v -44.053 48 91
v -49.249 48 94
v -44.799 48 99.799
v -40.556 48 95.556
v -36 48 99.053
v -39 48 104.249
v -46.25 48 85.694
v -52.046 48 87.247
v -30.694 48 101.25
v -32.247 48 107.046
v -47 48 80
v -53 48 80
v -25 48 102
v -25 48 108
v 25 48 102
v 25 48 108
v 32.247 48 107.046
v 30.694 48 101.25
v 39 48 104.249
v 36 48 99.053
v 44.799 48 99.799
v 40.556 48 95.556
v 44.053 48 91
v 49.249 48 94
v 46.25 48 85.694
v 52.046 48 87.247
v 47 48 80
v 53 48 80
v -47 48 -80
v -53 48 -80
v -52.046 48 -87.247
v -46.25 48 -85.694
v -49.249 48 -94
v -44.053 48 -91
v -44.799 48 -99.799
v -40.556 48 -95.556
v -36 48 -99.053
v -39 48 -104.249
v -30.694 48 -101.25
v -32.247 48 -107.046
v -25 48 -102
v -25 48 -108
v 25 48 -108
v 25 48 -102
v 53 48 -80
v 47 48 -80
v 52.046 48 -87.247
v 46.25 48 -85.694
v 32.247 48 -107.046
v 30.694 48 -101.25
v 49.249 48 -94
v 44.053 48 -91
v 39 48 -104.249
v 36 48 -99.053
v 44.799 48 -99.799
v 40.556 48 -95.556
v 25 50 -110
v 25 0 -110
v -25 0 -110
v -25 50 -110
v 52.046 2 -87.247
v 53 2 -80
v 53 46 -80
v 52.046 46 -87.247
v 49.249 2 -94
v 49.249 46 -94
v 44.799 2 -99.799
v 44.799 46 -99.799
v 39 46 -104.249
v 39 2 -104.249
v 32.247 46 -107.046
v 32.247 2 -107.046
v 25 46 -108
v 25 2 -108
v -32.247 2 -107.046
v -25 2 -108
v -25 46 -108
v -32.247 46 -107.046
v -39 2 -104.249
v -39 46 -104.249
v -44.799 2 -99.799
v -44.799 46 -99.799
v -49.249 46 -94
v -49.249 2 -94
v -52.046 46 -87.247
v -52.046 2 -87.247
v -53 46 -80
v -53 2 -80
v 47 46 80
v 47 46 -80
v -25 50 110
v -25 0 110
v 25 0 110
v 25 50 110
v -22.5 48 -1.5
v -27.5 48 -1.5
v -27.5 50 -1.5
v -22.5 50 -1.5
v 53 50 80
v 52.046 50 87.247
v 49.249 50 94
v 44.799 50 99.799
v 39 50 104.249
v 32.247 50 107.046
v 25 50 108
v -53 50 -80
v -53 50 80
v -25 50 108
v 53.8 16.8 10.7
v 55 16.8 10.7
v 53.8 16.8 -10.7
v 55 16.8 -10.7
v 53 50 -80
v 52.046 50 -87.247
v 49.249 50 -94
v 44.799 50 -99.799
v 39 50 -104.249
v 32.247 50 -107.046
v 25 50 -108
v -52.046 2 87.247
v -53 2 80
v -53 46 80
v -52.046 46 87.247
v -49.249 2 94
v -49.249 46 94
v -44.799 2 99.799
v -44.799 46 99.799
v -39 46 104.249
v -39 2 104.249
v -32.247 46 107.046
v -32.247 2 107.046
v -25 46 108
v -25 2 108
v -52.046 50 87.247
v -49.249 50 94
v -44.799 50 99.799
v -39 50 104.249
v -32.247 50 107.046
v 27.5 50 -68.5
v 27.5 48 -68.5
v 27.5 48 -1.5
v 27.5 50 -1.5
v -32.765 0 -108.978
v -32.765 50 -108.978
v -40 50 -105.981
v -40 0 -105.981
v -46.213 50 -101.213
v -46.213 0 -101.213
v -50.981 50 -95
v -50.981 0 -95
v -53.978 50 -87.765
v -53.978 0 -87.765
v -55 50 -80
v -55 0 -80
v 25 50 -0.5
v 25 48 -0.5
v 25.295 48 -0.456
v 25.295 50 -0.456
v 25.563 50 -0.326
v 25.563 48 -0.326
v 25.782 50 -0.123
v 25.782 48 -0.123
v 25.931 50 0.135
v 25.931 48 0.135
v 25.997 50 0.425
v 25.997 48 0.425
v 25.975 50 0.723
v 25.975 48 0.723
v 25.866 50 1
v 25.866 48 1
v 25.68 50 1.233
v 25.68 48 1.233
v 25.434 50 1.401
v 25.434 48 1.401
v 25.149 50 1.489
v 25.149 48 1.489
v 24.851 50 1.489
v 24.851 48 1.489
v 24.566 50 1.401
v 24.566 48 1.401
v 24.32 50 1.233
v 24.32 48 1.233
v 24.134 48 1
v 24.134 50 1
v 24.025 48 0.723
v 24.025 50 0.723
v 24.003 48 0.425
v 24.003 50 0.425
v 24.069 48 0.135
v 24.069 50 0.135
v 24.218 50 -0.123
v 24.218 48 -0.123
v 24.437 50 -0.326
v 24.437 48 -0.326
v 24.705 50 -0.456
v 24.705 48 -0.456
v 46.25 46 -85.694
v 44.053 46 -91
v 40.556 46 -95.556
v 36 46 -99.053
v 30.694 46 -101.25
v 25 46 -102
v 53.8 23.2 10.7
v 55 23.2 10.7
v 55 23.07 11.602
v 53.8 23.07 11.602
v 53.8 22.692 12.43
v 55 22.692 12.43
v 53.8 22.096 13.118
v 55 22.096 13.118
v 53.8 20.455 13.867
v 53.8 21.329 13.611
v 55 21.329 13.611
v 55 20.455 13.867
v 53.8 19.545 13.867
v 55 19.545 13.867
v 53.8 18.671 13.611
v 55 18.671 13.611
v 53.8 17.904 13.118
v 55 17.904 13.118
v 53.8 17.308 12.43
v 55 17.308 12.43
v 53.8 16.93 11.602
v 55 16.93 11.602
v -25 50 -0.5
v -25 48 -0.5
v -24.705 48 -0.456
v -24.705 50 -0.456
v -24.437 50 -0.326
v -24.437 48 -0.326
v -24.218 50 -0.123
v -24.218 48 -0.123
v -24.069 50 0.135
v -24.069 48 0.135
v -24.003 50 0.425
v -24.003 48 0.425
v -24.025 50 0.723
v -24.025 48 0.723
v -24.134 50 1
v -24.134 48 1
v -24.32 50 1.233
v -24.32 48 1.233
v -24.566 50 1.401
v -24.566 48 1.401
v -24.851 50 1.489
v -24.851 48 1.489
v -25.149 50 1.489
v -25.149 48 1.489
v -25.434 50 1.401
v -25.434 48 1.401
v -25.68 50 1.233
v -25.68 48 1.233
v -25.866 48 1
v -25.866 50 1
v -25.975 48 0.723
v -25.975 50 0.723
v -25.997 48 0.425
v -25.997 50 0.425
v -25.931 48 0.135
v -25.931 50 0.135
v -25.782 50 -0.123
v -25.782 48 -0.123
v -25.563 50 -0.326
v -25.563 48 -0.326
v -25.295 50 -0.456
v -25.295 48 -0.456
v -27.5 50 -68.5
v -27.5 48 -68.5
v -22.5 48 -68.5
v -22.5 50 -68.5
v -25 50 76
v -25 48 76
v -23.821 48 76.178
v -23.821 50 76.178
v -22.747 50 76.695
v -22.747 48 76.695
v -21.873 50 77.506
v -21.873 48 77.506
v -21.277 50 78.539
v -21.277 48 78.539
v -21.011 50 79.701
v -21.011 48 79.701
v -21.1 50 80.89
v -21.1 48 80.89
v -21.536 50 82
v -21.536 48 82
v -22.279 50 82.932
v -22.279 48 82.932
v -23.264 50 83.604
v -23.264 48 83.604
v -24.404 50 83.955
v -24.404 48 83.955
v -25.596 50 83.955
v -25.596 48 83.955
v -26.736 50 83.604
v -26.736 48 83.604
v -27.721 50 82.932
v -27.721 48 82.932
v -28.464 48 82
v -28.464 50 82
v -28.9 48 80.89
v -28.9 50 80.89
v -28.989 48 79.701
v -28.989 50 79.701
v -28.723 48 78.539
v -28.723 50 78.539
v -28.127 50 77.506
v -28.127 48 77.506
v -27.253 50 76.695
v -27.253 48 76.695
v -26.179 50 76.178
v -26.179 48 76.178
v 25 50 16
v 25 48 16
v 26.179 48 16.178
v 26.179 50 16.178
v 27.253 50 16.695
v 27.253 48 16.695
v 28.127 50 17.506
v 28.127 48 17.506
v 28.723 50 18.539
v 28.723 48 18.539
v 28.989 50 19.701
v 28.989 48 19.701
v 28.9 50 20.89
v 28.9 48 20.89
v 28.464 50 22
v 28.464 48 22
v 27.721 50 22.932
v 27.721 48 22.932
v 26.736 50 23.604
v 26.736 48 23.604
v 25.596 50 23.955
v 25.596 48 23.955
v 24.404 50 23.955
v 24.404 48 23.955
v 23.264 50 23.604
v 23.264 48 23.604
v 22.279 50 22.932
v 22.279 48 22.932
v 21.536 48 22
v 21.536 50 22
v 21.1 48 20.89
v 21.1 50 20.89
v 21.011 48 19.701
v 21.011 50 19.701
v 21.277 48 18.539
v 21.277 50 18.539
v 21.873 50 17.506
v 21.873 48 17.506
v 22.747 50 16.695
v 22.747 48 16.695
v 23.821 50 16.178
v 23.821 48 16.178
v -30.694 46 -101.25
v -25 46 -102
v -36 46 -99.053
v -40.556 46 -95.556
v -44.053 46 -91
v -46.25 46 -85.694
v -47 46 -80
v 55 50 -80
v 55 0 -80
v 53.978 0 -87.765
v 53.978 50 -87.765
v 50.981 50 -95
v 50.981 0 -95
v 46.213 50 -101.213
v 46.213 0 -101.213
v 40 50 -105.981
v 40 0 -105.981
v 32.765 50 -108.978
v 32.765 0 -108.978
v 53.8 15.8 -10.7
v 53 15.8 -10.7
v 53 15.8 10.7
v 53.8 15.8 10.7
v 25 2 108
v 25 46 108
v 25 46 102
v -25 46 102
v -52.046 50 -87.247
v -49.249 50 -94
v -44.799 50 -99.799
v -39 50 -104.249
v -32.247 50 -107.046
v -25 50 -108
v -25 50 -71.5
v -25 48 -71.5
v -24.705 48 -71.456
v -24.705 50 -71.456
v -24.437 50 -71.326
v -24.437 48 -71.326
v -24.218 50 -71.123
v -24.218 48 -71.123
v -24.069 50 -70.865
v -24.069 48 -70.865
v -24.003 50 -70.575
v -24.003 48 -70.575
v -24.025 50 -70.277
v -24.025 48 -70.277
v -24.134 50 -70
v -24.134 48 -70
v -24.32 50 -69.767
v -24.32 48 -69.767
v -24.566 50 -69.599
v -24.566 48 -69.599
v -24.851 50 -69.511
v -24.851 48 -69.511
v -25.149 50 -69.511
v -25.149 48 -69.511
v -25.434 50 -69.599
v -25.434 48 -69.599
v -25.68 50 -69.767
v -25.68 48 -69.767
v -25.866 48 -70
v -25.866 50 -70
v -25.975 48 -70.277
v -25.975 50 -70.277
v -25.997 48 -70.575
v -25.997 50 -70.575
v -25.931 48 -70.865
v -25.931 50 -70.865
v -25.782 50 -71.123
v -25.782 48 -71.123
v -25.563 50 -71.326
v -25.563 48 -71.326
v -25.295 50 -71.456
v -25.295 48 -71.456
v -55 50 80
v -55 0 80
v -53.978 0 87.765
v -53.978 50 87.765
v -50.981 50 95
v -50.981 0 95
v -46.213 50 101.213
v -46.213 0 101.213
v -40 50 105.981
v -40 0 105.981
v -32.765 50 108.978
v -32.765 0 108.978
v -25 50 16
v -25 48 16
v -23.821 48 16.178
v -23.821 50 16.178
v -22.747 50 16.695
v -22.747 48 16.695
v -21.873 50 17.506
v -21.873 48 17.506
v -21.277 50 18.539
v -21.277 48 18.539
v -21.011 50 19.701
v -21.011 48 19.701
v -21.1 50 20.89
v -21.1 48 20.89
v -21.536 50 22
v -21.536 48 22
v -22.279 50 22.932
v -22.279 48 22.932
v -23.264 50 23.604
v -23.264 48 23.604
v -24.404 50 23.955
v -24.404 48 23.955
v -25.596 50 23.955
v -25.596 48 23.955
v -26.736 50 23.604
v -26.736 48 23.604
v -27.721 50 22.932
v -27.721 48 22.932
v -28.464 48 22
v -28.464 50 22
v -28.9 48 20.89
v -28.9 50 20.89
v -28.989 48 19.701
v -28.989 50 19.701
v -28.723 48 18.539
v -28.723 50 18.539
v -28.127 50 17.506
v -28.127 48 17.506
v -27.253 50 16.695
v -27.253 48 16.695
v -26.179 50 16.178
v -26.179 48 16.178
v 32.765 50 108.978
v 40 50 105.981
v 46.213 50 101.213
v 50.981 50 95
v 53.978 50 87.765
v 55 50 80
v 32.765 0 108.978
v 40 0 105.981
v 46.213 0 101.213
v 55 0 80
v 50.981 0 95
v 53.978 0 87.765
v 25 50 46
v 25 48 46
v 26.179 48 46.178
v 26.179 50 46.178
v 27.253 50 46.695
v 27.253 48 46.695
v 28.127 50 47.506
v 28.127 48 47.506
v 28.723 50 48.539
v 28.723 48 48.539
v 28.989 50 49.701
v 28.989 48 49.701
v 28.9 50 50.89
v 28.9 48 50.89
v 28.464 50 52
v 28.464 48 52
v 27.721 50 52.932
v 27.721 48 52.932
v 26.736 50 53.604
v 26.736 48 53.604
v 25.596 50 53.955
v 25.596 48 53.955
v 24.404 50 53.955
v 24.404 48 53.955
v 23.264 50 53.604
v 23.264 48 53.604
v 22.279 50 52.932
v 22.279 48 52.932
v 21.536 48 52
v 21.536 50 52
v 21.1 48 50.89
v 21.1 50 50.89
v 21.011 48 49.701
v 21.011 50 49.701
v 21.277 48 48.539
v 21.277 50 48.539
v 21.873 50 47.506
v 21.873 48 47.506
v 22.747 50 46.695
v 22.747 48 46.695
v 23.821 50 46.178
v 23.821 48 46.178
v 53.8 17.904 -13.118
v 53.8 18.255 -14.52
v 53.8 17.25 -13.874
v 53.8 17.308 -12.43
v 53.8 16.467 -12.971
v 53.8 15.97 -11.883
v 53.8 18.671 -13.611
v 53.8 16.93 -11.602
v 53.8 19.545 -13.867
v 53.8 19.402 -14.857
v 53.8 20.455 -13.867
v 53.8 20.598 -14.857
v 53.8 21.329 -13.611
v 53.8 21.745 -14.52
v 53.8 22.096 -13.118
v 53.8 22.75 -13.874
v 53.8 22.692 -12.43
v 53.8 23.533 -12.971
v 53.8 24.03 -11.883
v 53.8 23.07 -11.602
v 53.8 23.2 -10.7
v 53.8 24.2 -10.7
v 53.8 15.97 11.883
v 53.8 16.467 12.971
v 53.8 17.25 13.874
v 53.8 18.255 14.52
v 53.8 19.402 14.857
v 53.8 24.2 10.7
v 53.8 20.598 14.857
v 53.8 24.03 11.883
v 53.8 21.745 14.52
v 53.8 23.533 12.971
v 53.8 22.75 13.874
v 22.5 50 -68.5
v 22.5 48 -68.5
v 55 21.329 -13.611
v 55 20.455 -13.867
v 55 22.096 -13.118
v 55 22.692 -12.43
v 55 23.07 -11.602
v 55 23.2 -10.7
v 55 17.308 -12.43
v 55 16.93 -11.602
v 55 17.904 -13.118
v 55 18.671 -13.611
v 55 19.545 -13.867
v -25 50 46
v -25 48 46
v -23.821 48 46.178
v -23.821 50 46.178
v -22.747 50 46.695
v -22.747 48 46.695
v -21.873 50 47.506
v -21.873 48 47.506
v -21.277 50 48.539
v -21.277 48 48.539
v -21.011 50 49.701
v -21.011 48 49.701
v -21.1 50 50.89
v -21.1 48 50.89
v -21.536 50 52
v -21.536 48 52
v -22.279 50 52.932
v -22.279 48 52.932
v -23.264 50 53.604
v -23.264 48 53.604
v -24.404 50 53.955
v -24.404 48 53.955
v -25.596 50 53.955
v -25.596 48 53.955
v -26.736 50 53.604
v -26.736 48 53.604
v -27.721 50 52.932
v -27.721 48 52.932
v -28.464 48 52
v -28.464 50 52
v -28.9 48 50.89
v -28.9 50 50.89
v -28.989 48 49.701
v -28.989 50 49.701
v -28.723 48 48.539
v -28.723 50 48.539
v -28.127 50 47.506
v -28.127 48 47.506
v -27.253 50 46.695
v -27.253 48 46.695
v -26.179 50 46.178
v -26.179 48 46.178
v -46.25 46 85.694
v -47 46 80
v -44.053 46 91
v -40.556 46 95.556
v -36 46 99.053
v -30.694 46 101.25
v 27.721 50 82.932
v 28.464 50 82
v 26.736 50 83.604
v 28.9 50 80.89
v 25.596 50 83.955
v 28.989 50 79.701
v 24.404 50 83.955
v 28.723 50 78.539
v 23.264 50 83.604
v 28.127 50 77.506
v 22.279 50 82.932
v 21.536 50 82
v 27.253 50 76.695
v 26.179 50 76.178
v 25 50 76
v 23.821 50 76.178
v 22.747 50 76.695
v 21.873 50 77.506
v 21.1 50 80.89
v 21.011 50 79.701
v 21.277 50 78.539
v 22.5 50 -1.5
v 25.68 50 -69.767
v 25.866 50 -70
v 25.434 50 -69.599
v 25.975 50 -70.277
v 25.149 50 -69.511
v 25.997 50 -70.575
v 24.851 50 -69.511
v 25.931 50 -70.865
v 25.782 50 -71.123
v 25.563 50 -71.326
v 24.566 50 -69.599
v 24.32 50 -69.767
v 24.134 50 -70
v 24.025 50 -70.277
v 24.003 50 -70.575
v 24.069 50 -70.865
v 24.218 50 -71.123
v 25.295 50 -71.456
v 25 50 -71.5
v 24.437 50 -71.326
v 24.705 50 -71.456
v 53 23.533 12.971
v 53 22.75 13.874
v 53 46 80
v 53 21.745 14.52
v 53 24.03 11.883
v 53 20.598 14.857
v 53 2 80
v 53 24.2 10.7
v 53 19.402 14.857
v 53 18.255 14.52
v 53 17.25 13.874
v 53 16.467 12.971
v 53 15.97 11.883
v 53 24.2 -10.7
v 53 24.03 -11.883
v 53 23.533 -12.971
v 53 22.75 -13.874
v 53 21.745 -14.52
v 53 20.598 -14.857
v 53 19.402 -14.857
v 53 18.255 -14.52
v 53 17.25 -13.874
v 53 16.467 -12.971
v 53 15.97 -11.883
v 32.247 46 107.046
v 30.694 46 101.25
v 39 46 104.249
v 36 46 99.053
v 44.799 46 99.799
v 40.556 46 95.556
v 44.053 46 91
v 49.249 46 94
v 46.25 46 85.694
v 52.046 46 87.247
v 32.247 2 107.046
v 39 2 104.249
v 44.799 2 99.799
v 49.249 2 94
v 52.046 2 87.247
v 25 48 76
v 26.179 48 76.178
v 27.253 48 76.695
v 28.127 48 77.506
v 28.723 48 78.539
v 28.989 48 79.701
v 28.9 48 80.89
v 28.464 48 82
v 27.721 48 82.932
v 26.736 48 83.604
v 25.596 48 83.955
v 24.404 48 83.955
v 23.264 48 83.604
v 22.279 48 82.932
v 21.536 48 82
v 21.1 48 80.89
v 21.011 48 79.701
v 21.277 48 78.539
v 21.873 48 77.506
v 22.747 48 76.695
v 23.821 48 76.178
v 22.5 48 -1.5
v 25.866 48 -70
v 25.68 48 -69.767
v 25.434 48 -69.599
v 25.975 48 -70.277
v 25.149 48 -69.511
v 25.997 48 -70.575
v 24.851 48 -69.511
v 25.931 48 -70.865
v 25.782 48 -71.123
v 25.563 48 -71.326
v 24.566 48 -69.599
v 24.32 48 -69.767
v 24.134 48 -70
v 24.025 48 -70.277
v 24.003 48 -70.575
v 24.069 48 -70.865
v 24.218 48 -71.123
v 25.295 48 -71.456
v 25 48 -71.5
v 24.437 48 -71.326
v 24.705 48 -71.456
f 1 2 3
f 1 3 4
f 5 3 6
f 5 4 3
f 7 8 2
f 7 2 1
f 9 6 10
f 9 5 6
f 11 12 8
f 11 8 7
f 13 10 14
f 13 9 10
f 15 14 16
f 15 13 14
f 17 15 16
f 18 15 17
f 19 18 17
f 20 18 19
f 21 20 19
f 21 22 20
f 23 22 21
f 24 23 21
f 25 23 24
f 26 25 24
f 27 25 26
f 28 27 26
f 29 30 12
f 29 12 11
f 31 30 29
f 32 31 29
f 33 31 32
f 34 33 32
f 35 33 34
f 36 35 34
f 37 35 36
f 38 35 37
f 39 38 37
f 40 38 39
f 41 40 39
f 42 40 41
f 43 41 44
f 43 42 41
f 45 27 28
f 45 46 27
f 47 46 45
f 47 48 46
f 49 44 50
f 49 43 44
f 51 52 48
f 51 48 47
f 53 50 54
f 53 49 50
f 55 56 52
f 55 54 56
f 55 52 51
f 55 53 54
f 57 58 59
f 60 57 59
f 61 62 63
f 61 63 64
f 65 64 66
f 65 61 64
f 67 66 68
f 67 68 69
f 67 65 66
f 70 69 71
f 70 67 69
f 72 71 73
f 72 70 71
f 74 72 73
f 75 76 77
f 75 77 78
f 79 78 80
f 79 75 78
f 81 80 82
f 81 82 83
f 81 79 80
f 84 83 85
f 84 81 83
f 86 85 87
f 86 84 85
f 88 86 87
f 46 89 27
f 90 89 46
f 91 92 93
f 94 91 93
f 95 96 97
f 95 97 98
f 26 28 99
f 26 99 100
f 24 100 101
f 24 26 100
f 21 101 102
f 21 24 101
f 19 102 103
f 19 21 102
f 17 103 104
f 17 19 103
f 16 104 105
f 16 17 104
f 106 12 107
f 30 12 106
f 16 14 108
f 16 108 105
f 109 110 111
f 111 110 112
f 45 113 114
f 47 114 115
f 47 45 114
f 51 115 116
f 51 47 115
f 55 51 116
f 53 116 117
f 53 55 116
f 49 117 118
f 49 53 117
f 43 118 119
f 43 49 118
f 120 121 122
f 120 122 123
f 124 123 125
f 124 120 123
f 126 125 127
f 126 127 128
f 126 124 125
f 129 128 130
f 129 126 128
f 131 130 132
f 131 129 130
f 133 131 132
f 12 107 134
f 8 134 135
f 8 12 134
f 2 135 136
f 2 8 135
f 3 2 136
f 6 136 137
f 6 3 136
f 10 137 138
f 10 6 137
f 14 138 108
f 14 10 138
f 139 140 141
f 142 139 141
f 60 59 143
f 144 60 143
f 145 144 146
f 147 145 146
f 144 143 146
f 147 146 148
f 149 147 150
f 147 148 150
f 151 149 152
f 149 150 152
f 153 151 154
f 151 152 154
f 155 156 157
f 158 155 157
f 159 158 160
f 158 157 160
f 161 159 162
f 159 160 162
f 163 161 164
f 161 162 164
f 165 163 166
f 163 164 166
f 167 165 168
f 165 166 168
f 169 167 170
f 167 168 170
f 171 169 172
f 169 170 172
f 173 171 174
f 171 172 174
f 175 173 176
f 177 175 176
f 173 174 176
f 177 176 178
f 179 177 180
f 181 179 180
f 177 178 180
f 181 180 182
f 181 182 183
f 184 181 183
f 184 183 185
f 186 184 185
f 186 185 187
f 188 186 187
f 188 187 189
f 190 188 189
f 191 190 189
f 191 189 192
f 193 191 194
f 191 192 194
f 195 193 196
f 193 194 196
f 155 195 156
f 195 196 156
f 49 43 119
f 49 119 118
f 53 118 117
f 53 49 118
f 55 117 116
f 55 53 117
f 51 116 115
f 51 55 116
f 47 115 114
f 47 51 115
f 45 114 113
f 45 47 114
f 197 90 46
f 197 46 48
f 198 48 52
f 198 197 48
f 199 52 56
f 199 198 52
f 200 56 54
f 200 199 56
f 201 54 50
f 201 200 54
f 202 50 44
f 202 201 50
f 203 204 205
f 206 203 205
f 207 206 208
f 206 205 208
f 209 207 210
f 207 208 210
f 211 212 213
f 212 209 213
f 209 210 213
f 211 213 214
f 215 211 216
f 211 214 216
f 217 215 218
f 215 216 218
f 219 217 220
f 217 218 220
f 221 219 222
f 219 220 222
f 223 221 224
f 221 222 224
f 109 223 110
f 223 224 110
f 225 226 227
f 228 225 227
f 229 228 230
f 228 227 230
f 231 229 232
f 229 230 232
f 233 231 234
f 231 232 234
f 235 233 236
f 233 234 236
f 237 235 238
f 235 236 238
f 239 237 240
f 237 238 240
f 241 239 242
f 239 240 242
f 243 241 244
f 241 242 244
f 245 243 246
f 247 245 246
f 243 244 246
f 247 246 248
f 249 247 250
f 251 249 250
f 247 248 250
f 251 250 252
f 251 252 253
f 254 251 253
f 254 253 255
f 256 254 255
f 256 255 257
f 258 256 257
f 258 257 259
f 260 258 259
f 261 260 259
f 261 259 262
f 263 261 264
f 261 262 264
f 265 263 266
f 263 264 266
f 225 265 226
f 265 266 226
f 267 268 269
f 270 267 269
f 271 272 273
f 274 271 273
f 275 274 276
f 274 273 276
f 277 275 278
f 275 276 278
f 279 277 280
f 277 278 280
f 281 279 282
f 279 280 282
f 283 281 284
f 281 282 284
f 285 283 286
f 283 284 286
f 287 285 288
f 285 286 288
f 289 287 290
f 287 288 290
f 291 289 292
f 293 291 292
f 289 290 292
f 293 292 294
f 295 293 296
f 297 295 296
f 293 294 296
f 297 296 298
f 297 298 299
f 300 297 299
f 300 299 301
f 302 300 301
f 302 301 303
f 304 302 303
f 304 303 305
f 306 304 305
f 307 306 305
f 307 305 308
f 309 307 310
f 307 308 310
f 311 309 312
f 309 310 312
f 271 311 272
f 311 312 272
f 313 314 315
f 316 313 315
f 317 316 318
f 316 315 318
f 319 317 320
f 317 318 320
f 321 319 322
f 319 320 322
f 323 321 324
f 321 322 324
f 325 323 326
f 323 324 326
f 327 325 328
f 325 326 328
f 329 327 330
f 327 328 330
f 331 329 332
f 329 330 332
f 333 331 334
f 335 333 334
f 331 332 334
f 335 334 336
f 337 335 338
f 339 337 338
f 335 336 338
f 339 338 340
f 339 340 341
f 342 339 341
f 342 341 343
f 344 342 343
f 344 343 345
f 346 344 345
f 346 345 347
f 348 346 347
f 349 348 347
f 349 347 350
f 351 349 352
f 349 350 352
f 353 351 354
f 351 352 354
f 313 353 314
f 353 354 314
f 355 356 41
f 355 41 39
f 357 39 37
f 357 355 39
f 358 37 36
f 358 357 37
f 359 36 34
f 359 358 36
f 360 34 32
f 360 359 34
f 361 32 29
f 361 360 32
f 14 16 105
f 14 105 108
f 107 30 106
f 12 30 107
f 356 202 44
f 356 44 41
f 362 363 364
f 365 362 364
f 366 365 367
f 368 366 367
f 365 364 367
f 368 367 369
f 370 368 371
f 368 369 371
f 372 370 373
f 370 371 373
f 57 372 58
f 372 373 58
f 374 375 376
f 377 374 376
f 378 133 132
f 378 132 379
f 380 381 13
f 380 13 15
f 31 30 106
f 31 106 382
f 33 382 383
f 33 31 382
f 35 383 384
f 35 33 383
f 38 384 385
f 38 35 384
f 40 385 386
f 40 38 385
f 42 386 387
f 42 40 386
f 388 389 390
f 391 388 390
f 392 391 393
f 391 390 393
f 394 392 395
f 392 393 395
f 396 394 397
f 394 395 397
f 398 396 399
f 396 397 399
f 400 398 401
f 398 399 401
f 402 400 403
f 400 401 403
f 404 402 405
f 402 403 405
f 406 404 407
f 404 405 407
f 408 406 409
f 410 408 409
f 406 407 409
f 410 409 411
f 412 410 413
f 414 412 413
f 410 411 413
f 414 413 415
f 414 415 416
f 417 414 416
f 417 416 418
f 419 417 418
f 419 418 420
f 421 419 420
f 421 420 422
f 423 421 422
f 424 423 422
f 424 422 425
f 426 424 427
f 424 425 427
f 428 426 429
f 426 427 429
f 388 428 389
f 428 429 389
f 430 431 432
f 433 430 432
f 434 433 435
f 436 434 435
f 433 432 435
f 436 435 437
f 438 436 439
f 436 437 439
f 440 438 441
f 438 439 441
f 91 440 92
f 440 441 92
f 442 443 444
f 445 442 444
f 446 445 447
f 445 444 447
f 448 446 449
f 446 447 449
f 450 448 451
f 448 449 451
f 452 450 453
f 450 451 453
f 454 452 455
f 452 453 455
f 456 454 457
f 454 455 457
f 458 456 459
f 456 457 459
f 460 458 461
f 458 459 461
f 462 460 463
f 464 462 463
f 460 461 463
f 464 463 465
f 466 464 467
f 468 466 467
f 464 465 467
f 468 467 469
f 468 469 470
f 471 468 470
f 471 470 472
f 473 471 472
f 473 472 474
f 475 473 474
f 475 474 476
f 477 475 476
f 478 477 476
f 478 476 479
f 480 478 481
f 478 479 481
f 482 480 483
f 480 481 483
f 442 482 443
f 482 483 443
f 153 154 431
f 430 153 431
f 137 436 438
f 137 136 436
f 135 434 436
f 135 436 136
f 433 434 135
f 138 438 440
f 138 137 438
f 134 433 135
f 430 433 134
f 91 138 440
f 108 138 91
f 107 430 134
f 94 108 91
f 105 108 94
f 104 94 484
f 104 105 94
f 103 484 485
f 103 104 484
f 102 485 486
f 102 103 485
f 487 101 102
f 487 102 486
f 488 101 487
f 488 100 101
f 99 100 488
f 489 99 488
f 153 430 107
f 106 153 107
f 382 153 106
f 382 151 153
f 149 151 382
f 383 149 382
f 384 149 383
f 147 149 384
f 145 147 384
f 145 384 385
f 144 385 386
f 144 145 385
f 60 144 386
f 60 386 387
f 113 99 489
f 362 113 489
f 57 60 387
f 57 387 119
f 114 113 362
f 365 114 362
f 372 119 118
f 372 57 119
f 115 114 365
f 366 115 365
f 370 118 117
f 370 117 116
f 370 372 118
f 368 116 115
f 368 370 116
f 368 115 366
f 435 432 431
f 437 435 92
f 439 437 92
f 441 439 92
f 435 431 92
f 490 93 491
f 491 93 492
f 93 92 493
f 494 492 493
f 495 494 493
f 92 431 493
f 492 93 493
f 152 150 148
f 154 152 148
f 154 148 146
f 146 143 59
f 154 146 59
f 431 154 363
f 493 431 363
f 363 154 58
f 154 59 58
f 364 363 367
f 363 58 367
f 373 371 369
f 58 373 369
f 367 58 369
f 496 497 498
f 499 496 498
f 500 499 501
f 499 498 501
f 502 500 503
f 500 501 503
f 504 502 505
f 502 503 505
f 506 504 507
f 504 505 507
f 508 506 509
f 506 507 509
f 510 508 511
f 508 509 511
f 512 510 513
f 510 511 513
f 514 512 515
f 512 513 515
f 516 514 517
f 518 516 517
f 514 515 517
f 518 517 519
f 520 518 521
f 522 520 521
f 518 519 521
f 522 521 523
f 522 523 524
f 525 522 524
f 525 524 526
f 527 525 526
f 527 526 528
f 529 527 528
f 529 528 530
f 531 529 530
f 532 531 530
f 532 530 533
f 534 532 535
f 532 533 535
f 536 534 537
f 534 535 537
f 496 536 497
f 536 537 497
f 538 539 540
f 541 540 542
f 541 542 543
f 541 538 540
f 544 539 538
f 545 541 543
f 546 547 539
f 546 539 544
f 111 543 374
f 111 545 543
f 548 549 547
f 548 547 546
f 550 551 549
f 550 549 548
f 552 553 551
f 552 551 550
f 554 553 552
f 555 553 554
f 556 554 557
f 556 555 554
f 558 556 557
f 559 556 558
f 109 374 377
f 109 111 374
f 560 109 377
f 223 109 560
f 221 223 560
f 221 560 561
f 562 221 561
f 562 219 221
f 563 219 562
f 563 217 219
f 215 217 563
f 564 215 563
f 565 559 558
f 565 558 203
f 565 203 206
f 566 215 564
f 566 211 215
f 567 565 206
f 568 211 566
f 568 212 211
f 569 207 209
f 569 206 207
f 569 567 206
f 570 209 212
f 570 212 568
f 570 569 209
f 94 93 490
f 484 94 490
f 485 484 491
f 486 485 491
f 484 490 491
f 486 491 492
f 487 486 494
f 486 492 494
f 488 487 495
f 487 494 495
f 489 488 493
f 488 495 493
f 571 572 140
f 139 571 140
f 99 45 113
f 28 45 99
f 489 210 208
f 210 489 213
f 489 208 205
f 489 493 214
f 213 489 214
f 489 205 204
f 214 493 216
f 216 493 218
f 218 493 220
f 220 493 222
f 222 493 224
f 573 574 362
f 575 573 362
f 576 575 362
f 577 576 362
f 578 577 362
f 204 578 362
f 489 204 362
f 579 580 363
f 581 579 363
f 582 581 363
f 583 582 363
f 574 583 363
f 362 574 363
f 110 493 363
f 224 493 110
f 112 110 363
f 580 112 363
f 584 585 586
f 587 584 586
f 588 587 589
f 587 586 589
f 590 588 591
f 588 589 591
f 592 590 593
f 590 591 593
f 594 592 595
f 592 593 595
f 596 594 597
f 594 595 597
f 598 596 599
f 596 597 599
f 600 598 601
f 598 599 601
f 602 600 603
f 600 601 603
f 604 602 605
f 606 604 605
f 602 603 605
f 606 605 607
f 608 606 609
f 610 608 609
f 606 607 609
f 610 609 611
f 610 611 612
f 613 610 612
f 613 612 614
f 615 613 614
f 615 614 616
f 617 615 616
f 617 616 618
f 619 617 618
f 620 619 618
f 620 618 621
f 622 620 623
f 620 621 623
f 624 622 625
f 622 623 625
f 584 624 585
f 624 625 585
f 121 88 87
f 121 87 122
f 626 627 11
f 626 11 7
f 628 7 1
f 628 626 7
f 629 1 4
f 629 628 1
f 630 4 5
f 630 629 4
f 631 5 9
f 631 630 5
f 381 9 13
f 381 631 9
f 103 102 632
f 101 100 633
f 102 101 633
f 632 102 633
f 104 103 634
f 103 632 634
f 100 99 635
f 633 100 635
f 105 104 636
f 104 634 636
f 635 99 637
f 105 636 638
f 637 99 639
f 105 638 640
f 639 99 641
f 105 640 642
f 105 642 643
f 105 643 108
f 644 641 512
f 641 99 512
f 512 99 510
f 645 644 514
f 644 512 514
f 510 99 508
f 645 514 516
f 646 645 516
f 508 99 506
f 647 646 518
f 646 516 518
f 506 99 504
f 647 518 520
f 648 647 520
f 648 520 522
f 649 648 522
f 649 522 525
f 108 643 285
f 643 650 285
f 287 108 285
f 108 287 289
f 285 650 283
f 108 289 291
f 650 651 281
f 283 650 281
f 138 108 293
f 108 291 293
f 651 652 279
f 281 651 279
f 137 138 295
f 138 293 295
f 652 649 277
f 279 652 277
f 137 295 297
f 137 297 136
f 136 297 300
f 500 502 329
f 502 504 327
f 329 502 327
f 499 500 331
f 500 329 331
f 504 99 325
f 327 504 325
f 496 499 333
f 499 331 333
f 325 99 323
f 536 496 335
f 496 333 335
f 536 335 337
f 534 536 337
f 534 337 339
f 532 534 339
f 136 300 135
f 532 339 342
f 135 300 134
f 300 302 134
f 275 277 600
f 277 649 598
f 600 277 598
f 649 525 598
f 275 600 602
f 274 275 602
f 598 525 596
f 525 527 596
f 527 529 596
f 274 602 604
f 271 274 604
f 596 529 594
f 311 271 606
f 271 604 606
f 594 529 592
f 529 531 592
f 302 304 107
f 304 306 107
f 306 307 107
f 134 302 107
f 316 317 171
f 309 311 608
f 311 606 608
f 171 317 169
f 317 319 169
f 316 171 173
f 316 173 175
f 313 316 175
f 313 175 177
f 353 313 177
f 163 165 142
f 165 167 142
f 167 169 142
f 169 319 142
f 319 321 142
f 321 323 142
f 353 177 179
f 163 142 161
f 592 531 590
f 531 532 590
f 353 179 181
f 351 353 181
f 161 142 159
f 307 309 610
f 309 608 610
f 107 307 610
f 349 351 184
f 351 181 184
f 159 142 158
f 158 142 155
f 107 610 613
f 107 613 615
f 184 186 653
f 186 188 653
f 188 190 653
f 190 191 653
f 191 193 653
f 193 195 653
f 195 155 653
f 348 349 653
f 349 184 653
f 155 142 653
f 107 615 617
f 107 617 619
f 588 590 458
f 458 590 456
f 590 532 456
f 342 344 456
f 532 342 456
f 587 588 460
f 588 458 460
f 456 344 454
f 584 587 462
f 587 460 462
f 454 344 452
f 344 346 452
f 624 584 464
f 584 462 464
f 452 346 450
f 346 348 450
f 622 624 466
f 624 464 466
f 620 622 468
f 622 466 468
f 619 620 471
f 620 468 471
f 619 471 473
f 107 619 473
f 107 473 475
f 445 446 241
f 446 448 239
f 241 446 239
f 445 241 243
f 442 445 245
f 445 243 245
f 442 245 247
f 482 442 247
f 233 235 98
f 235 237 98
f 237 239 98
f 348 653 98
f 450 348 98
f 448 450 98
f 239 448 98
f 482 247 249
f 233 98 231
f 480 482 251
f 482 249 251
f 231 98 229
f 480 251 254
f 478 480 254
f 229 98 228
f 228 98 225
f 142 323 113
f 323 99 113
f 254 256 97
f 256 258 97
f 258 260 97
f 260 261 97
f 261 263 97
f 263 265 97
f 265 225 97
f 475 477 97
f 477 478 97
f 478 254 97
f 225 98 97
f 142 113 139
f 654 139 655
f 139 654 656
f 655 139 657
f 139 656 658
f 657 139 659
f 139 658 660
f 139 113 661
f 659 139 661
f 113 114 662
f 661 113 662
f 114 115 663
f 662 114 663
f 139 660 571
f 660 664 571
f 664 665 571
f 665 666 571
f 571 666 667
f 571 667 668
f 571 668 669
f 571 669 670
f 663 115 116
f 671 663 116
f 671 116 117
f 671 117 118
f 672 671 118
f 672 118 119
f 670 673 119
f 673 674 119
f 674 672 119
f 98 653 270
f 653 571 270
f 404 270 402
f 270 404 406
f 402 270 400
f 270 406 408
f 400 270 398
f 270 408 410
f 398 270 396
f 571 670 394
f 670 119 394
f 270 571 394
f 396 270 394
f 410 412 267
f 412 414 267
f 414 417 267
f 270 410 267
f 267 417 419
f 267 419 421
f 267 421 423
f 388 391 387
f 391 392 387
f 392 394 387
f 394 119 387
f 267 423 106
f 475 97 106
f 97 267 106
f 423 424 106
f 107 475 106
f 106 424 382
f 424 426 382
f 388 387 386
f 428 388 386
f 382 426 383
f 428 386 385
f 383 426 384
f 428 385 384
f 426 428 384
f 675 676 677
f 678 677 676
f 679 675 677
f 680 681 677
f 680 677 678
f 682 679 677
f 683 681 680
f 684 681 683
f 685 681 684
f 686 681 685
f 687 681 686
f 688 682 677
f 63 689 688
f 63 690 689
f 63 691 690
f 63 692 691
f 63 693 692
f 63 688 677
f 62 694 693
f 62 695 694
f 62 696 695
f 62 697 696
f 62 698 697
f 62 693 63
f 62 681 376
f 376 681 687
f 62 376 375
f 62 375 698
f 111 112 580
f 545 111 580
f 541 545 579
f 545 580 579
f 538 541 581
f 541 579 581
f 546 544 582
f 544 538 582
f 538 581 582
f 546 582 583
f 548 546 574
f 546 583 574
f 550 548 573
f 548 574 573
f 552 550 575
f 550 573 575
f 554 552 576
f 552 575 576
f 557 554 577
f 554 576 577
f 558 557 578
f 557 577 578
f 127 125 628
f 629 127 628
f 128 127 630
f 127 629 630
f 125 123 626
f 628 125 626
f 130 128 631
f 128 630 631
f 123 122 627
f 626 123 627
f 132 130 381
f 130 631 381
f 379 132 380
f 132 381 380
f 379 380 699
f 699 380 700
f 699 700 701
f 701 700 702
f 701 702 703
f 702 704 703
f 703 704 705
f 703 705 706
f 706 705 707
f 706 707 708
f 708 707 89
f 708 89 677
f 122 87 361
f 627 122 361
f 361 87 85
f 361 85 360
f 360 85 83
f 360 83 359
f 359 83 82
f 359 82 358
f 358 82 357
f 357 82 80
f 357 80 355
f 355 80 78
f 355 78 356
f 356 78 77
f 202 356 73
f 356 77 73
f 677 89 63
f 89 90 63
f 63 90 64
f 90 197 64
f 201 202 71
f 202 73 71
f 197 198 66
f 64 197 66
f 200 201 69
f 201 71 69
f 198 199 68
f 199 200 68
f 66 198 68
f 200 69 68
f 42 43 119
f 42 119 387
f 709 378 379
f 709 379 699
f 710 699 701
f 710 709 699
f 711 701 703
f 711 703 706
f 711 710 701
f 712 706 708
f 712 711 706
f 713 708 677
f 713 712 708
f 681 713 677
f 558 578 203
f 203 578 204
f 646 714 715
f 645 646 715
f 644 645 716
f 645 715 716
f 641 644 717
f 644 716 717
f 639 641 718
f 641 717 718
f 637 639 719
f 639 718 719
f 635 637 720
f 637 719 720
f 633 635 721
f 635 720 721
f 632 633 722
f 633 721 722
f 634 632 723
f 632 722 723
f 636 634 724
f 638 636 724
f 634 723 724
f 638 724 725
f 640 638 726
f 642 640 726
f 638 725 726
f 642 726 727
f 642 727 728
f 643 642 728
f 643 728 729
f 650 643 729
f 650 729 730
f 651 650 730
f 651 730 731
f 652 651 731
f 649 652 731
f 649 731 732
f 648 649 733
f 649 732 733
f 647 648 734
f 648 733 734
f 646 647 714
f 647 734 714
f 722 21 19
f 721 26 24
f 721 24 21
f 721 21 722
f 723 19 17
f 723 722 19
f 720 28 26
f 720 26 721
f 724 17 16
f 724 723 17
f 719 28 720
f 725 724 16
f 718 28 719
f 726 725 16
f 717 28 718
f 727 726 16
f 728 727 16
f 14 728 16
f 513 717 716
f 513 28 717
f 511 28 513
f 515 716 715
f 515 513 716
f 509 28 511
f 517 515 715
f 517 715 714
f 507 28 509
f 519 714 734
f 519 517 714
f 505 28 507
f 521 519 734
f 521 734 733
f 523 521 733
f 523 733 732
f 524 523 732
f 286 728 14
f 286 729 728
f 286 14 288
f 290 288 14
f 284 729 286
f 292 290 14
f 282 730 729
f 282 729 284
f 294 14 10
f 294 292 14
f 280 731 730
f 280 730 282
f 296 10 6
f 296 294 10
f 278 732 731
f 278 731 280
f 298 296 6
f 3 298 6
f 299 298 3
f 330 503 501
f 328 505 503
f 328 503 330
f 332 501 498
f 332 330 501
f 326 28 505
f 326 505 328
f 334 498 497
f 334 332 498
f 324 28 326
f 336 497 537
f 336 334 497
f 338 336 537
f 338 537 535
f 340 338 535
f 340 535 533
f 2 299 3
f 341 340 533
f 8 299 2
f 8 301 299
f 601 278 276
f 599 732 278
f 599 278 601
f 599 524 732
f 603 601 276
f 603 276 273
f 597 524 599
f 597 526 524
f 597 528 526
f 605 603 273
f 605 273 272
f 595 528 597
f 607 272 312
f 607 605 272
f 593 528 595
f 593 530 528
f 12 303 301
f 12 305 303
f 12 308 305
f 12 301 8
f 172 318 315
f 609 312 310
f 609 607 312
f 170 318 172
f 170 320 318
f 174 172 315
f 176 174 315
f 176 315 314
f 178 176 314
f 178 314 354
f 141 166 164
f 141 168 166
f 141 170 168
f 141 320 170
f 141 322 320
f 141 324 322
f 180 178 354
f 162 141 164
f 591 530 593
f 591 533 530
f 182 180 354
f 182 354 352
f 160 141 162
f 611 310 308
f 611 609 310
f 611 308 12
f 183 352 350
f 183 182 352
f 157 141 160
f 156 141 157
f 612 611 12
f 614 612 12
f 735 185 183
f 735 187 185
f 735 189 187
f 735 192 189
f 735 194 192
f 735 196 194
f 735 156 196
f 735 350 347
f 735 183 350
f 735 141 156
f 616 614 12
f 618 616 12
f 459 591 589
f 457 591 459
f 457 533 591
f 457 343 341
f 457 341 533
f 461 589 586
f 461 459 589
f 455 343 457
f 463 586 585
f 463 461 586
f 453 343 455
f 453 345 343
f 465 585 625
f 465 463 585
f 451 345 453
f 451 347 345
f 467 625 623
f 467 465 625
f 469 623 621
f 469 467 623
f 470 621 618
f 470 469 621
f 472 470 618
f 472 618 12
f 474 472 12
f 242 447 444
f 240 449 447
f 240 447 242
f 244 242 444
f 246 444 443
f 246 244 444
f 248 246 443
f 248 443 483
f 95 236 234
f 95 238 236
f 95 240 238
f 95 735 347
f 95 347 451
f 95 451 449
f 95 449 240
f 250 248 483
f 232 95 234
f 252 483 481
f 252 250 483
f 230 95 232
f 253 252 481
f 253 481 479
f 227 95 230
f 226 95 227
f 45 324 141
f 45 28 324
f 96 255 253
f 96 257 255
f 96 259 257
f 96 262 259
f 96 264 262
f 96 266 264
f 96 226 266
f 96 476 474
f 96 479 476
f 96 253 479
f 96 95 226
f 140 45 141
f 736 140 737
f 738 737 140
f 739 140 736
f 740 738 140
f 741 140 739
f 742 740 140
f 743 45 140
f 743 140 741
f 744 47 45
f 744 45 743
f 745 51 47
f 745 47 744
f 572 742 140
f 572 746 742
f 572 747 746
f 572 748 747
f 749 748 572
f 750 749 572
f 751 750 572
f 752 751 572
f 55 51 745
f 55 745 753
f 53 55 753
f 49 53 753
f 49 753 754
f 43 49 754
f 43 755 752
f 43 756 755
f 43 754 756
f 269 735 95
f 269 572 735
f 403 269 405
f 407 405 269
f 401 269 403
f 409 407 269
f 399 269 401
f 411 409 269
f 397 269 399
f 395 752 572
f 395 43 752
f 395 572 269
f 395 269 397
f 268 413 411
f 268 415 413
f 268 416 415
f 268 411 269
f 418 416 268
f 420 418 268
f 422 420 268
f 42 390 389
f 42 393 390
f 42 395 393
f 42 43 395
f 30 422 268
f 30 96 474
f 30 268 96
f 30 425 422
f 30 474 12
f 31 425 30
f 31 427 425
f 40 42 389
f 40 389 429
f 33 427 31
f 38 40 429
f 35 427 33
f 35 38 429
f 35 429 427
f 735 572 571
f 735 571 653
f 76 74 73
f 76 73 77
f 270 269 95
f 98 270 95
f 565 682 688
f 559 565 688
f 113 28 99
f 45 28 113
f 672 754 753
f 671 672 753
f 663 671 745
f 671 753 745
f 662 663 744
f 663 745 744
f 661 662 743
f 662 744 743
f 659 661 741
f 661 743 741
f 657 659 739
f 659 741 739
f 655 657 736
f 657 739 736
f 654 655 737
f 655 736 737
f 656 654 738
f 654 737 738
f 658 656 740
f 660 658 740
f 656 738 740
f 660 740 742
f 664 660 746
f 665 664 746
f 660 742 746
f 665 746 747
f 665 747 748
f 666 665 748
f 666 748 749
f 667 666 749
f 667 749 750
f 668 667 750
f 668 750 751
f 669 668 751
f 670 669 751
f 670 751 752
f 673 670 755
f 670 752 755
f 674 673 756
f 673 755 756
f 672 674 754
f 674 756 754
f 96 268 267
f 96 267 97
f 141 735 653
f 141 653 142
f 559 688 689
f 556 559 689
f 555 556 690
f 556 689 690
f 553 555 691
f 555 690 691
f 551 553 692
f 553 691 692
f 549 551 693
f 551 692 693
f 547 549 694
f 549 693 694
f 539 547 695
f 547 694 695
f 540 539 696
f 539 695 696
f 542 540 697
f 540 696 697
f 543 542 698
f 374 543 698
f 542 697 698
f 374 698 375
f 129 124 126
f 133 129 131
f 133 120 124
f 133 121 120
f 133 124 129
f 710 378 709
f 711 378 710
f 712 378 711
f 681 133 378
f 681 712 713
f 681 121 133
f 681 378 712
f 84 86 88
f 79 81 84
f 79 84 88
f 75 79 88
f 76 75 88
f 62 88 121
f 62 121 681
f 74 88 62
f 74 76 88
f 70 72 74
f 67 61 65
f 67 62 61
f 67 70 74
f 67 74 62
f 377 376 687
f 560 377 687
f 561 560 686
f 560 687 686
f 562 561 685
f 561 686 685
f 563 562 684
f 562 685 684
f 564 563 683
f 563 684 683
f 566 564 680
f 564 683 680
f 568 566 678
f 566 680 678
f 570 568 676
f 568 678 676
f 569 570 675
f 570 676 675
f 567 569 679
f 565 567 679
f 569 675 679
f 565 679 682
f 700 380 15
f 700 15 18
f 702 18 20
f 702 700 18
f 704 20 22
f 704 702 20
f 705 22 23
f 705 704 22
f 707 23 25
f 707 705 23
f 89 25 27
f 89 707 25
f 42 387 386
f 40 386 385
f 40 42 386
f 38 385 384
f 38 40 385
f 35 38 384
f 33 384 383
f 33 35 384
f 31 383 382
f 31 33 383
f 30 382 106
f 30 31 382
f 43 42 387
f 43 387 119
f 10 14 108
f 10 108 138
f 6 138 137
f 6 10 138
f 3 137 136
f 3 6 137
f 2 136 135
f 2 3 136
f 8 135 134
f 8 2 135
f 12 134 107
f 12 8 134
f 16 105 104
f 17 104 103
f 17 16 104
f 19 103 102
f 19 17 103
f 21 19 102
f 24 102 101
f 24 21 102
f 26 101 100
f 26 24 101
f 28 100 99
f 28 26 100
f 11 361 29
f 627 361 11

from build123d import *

# Parameters (mm, degrees)
BOSS_EXTRUDE1_DEPTH = 50
SHELL1_T            = -2
BOSS_EXTRUDE2_START = 44
BOSS_EXTRUDE2_DEPTH = 2
BOSS_EXTRUDE3_START = 48
BOSS_EXTRUDE3_DEPTH = 2
SKETCH3_R           = 4
SKETCH3_R_2         = 1
SKETCH3_W           = 5
SKETCH3_H           = 67
CUT_EXTRUDE1_DEPTH  = 2
CUT_EXTRUDE2_DEPTH  = 2
CUT_EXTRUDE3_START  = -2
CUT_EXTRUDE3_DEPTH  = 0.8


with BuildPart() as part:
    # Sketch1 → Boss-Extrude1 (new body)
    with BuildSketch(Plane(origin=(0, 0, 0), x_dir=(1, 0, 0), z_dir=(0, 1, 0))):
        with BuildLine():
            Line((-25, -110), (25, -110))
            ThreePointArc((25, -110), (46.213203436, -101.213203436), (55, -80))
            Line((55, -80), (55, 80))
            ThreePointArc((55, 80), (46.213203436, 101.213203436), (25, 110))
            Line((25, 110), (-25, 110))
            ThreePointArc((-25, 110), (-46.213203436, 101.213203436), (-55, 80))
            Line((-55, 80), (-55, -80))
            ThreePointArc((-55, -80), (-46.213203436, -101.213203436), (-25, -110))
        make_face()
    extrude(amount=BOSS_EXTRUDE1_DEPTH)

    # Shell1
    shell1_openings = [part.faces().sort_by_distance(p)[0] for p in [
        (0, 50, 0),
    ]]
    offset(amount=SHELL1_T, openings=shell1_openings, kind=Kind.INTERSECTION)

    # Sketch2 → Boss-Extrude2 (add)
    with BuildSketch(Plane(origin=(0, 2, 0), x_dir=(1, 0, 0), z_dir=(0, 1, 0)).offset(BOSS_EXTRUDE2_START)):
        with BuildLine():
            Line((-53, 80), (-53, -80))
            ThreePointArc((-53, -80), (-44.798989873, -99.798989873), (-25, -108))
            Line((-25, -108), (25, -108))
            ThreePointArc((25, -108), (44.798989873, -99.798989873), (53, -80))
            Line((53, -80), (53, 80))
            ThreePointArc((53, 80), (44.798989873, 99.798989873), (25, 108))
            Line((25, 108), (-25, 108))
            ThreePointArc((-25, 108), (-44.798989873, 99.798989873), (-53, 80))
        make_face()
        with BuildLine():
            ThreePointArc((-25, 102), (-40.556349186, 95.556349186), (-47, 80))
            Line((-47, 80), (-47, -80))
            ThreePointArc((-47, -80), (-40.556349186, -95.556349186), (-25, -102))
            Line((-25, -102), (25, -102))
            ThreePointArc((25, -102), (40.556349186, -95.556349186), (47, -80))
            Line((47, -80), (47, 80))
            ThreePointArc((47, 80), (40.556349186, 95.556349186), (25, 102))
            Line((25, 102), (-25, 102))
        make_face(mode=Mode.SUBTRACT)
    extrude(amount=BOSS_EXTRUDE2_DEPTH)

    # Sketch4 → Cut-Extrude2 (cut)
    with BuildSketch(Plane(origin=(55, 0, 0), x_dir=(0, 0, -1), z_dir=(1, 0, 0))):
        with BuildLine():
            Line((-10.7, 16.8), (10.7, 16.8))
            ThreePointArc((10.7, 16.8), (13.9, 20), (10.7, 23.2))
            Line((10.7, 23.2), (-10.7, 23.2))
            ThreePointArc((-10.7, 23.2), (-13.9, 20), (-10.7, 16.8))
        make_face()
    extrude(amount=-CUT_EXTRUDE2_DEPTH, mode=Mode.SUBTRACT)

    # Sketch4<4> → Cut-Extrude3 (cut)
    with BuildSketch(Plane(origin=(55, 0, 0), x_dir=(0, 0, -1), z_dir=(1, 0, 0)).offset(CUT_EXTRUDE3_START)):
        with BuildLine():
            Line((-10.7, 24.2), (10.7, 24.2))
            ThreePointArc((10.7, 24.2), (14.9, 20), (10.7, 15.8))
            Line((10.7, 15.8), (-10.7, 15.8))
            ThreePointArc((-10.7, 15.8), (-14.9, 20), (-10.7, 24.2))
        make_face()
        with BuildLine():
            Line((-10.7, 23.2), (10.7, 23.2))
            ThreePointArc((10.7, 23.2), (13.9, 20), (10.7, 16.8))
            Line((10.7, 16.8), (-10.7, 16.8))
            ThreePointArc((-10.7, 16.8), (-13.9, 20), (-10.7, 23.2))
        make_face(mode=Mode.SUBTRACT)
    extrude(amount=CUT_EXTRUDE3_DEPTH, mode=Mode.SUBTRACT)


with BuildPart() as body_2:
    # Sketch1<3> → Boss-Extrude3 (new body)
    with BuildSketch(Plane(origin=(0, 0, 0), x_dir=(1, 0, 0), z_dir=(0, 1, 0)).offset(BOSS_EXTRUDE3_START)):
        with BuildLine():
            Line((-53, -80), (-53, 80))
            ThreePointArc((-53, 80), (-44.798989873, 99.798989873), (-25, 108))
            Line((-25, 108), (25, 108))
            ThreePointArc((25, 108), (44.798989873, 99.798989873), (53, 80))
            Line((53, 80), (53, -80))
            ThreePointArc((53, -80), (44.798989873, -99.798989873), (25, -108))
            Line((25, -108), (-25, -108))
            ThreePointArc((-25, -108), (-44.798989873, -99.798989873), (-53, -80))
        make_face()
    extrude(amount=BOSS_EXTRUDE3_DEPTH)

    # Sketch3 → Cut-Extrude1 (cut)
    with BuildSketch(Plane.XZ.offset(-48)):
        with Locations(Location((-25, 80, 0), (0, 0, 270))):
            Circle(SKETCH3_R)
        with Locations(Location((25, 80, 0), (0, 0, 270))):
            Circle(SKETCH3_R)
        with Locations(Location((-25, 50, 0), (0, 0, 270))):
            Circle(SKETCH3_R)
        with Locations(Location((25, 50, 0), (0, 0, 270))):
            Circle(SKETCH3_R)
        with Locations(Location((-25, 20, 0), (0, 0, 270))):
            Circle(SKETCH3_R)
        with Locations(Location((25, 20, 0), (0, 0, 270))):
            Circle(SKETCH3_R)
        with Locations(Location((-25, 0.5, 0), (0, 0, 270))):
            Circle(SKETCH3_R_2)
        with Locations(Location((25, 0.5, 0), (0, 0, 270))):
            Circle(SKETCH3_R_2)
        with Locations(Location((25, -70.5, 0), (0, 0, 270))):
            Circle(SKETCH3_R_2)
        with Locations(Location((-25, -70.5, 0), (0, 0, 270))):
            Circle(SKETCH3_R_2)
        with Locations((-25, -35)):
            Rectangle(SKETCH3_W, SKETCH3_H)
        with Locations((25, -35)):
            Rectangle(SKETCH3_W, SKETCH3_H)
    extrude(amount=-CUT_EXTRUDE1_DEPTH, mode=Mode.SUBTRACT)


solid = Compound([part.part, body_2.part])
